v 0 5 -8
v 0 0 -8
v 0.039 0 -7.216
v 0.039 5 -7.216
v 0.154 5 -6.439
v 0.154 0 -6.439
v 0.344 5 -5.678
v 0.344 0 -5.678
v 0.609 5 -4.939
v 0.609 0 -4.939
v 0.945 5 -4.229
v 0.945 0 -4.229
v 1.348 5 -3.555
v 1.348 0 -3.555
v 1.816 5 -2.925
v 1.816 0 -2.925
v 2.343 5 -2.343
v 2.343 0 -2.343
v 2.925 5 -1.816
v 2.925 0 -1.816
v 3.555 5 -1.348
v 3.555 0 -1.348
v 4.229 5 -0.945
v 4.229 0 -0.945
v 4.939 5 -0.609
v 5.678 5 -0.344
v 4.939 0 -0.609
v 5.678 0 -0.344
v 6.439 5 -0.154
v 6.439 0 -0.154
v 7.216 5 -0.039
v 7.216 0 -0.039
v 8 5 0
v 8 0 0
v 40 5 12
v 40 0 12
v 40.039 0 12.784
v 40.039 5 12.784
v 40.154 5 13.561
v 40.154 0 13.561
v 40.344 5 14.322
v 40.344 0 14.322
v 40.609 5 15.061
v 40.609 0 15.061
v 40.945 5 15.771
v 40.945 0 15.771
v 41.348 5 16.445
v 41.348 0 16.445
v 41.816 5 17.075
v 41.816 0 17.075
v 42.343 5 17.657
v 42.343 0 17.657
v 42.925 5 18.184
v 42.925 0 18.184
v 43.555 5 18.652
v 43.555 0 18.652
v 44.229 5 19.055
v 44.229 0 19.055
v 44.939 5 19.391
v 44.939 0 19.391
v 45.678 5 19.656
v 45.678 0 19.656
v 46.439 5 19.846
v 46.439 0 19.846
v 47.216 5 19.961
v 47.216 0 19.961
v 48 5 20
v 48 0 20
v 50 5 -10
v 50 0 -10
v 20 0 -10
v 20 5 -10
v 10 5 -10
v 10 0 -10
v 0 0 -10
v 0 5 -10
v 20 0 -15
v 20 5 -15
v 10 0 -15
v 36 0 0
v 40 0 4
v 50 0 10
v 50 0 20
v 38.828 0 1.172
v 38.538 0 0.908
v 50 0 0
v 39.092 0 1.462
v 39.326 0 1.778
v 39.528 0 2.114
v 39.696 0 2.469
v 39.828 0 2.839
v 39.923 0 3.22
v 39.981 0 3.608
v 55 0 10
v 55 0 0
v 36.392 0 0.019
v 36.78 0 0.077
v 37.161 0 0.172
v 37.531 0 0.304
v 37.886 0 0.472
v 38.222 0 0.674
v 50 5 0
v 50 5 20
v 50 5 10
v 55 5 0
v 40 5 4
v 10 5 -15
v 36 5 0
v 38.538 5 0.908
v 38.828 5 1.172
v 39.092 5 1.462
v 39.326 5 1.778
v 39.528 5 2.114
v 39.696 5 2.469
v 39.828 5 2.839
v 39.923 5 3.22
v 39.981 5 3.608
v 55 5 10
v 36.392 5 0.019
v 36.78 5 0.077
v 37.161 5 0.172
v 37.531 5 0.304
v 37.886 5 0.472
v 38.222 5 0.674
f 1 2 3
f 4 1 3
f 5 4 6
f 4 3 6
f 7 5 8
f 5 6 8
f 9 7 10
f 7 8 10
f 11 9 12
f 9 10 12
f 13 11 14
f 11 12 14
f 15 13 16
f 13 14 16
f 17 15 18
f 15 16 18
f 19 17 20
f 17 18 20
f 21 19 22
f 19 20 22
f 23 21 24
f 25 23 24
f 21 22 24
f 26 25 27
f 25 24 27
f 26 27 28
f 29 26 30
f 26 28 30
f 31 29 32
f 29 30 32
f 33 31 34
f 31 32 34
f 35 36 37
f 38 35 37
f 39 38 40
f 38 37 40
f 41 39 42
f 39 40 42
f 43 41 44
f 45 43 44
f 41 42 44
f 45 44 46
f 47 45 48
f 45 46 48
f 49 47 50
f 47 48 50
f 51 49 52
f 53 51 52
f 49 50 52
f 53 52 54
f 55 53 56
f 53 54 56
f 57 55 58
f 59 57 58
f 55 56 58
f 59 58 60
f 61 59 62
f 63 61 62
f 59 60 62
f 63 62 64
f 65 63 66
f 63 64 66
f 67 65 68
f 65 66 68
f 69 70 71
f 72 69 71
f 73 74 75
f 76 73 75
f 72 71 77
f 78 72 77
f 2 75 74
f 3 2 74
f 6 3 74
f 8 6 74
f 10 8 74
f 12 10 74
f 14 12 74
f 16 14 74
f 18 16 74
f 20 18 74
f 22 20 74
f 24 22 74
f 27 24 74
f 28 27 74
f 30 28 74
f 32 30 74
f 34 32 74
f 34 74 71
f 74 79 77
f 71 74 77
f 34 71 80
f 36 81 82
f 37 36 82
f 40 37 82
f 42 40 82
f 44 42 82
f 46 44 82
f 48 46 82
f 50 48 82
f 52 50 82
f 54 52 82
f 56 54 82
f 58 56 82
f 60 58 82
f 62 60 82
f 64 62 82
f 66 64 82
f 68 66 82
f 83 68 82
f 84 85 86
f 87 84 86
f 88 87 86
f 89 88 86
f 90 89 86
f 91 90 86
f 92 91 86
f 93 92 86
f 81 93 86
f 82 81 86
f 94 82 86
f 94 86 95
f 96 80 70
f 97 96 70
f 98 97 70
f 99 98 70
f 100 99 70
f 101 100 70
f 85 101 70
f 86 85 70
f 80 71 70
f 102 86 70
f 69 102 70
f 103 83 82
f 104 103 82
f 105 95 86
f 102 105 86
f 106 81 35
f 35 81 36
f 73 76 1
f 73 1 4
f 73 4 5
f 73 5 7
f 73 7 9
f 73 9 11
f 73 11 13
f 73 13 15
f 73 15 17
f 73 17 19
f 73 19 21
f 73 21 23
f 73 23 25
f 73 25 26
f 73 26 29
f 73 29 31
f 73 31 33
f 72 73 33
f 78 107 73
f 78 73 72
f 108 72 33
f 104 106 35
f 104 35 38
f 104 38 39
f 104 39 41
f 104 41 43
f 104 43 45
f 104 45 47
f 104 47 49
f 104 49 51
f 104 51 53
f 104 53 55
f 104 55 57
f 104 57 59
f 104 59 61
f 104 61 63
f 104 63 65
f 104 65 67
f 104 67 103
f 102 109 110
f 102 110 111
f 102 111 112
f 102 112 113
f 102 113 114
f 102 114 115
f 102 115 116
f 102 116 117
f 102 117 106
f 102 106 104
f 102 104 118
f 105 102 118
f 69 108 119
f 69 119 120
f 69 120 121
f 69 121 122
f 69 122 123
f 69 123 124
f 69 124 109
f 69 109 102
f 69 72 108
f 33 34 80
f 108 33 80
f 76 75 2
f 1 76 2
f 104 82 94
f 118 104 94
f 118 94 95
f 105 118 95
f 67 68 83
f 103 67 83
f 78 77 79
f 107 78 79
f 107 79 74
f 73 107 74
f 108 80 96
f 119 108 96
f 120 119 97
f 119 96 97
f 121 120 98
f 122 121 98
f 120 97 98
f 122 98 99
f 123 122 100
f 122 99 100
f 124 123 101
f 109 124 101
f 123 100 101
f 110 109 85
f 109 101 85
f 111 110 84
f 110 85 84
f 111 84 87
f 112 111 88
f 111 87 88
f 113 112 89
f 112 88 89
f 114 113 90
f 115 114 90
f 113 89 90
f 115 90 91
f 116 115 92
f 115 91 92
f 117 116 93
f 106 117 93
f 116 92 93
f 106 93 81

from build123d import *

# Parameters (mm, degrees)
EXTRUDE_1_DEPTH = 5


with BuildPart() as part:
    # 草图1 → 凸台-拉伸1 (new body)
    with BuildSketch(Plane(origin=(0, 0, 0), x_dir=(1, 0, 0), z_dir=(0, 1, 0))):
        with BuildLine():
            Line((8, 0), (36, 0))
            ThreePointArc((36, 0), (38.828427125, -1.171572875), (40, -4))
            Line((40, -4), (40, -12))
            ThreePointArc((40, -12), (42.343145751, -17.656854249), (48, -20))
            Line((48, -20), (50, -20))
            Line((50, -20), (50, -10))
            Line((50, -10), (55, -10))
            Line((55, -10), (55, 0))
            Line((55, 0), (50, 0))
            Line((50, 0), (50, 10))
            Line((50, 10), (20, 10))
            Line((20, 10), (20, 15))
            Line((20, 15), (10, 15))
            Line((10, 15), (10, 10))
            Line((10, 10), (0, 10))
            Line((0, 10), (0, 8))
            ThreePointArc((0, 8), (2.343145751, 2.343145751), (8, 0))
        make_face()
    extrude(amount=EXTRUDE_1_DEPTH)


solid = part.part
